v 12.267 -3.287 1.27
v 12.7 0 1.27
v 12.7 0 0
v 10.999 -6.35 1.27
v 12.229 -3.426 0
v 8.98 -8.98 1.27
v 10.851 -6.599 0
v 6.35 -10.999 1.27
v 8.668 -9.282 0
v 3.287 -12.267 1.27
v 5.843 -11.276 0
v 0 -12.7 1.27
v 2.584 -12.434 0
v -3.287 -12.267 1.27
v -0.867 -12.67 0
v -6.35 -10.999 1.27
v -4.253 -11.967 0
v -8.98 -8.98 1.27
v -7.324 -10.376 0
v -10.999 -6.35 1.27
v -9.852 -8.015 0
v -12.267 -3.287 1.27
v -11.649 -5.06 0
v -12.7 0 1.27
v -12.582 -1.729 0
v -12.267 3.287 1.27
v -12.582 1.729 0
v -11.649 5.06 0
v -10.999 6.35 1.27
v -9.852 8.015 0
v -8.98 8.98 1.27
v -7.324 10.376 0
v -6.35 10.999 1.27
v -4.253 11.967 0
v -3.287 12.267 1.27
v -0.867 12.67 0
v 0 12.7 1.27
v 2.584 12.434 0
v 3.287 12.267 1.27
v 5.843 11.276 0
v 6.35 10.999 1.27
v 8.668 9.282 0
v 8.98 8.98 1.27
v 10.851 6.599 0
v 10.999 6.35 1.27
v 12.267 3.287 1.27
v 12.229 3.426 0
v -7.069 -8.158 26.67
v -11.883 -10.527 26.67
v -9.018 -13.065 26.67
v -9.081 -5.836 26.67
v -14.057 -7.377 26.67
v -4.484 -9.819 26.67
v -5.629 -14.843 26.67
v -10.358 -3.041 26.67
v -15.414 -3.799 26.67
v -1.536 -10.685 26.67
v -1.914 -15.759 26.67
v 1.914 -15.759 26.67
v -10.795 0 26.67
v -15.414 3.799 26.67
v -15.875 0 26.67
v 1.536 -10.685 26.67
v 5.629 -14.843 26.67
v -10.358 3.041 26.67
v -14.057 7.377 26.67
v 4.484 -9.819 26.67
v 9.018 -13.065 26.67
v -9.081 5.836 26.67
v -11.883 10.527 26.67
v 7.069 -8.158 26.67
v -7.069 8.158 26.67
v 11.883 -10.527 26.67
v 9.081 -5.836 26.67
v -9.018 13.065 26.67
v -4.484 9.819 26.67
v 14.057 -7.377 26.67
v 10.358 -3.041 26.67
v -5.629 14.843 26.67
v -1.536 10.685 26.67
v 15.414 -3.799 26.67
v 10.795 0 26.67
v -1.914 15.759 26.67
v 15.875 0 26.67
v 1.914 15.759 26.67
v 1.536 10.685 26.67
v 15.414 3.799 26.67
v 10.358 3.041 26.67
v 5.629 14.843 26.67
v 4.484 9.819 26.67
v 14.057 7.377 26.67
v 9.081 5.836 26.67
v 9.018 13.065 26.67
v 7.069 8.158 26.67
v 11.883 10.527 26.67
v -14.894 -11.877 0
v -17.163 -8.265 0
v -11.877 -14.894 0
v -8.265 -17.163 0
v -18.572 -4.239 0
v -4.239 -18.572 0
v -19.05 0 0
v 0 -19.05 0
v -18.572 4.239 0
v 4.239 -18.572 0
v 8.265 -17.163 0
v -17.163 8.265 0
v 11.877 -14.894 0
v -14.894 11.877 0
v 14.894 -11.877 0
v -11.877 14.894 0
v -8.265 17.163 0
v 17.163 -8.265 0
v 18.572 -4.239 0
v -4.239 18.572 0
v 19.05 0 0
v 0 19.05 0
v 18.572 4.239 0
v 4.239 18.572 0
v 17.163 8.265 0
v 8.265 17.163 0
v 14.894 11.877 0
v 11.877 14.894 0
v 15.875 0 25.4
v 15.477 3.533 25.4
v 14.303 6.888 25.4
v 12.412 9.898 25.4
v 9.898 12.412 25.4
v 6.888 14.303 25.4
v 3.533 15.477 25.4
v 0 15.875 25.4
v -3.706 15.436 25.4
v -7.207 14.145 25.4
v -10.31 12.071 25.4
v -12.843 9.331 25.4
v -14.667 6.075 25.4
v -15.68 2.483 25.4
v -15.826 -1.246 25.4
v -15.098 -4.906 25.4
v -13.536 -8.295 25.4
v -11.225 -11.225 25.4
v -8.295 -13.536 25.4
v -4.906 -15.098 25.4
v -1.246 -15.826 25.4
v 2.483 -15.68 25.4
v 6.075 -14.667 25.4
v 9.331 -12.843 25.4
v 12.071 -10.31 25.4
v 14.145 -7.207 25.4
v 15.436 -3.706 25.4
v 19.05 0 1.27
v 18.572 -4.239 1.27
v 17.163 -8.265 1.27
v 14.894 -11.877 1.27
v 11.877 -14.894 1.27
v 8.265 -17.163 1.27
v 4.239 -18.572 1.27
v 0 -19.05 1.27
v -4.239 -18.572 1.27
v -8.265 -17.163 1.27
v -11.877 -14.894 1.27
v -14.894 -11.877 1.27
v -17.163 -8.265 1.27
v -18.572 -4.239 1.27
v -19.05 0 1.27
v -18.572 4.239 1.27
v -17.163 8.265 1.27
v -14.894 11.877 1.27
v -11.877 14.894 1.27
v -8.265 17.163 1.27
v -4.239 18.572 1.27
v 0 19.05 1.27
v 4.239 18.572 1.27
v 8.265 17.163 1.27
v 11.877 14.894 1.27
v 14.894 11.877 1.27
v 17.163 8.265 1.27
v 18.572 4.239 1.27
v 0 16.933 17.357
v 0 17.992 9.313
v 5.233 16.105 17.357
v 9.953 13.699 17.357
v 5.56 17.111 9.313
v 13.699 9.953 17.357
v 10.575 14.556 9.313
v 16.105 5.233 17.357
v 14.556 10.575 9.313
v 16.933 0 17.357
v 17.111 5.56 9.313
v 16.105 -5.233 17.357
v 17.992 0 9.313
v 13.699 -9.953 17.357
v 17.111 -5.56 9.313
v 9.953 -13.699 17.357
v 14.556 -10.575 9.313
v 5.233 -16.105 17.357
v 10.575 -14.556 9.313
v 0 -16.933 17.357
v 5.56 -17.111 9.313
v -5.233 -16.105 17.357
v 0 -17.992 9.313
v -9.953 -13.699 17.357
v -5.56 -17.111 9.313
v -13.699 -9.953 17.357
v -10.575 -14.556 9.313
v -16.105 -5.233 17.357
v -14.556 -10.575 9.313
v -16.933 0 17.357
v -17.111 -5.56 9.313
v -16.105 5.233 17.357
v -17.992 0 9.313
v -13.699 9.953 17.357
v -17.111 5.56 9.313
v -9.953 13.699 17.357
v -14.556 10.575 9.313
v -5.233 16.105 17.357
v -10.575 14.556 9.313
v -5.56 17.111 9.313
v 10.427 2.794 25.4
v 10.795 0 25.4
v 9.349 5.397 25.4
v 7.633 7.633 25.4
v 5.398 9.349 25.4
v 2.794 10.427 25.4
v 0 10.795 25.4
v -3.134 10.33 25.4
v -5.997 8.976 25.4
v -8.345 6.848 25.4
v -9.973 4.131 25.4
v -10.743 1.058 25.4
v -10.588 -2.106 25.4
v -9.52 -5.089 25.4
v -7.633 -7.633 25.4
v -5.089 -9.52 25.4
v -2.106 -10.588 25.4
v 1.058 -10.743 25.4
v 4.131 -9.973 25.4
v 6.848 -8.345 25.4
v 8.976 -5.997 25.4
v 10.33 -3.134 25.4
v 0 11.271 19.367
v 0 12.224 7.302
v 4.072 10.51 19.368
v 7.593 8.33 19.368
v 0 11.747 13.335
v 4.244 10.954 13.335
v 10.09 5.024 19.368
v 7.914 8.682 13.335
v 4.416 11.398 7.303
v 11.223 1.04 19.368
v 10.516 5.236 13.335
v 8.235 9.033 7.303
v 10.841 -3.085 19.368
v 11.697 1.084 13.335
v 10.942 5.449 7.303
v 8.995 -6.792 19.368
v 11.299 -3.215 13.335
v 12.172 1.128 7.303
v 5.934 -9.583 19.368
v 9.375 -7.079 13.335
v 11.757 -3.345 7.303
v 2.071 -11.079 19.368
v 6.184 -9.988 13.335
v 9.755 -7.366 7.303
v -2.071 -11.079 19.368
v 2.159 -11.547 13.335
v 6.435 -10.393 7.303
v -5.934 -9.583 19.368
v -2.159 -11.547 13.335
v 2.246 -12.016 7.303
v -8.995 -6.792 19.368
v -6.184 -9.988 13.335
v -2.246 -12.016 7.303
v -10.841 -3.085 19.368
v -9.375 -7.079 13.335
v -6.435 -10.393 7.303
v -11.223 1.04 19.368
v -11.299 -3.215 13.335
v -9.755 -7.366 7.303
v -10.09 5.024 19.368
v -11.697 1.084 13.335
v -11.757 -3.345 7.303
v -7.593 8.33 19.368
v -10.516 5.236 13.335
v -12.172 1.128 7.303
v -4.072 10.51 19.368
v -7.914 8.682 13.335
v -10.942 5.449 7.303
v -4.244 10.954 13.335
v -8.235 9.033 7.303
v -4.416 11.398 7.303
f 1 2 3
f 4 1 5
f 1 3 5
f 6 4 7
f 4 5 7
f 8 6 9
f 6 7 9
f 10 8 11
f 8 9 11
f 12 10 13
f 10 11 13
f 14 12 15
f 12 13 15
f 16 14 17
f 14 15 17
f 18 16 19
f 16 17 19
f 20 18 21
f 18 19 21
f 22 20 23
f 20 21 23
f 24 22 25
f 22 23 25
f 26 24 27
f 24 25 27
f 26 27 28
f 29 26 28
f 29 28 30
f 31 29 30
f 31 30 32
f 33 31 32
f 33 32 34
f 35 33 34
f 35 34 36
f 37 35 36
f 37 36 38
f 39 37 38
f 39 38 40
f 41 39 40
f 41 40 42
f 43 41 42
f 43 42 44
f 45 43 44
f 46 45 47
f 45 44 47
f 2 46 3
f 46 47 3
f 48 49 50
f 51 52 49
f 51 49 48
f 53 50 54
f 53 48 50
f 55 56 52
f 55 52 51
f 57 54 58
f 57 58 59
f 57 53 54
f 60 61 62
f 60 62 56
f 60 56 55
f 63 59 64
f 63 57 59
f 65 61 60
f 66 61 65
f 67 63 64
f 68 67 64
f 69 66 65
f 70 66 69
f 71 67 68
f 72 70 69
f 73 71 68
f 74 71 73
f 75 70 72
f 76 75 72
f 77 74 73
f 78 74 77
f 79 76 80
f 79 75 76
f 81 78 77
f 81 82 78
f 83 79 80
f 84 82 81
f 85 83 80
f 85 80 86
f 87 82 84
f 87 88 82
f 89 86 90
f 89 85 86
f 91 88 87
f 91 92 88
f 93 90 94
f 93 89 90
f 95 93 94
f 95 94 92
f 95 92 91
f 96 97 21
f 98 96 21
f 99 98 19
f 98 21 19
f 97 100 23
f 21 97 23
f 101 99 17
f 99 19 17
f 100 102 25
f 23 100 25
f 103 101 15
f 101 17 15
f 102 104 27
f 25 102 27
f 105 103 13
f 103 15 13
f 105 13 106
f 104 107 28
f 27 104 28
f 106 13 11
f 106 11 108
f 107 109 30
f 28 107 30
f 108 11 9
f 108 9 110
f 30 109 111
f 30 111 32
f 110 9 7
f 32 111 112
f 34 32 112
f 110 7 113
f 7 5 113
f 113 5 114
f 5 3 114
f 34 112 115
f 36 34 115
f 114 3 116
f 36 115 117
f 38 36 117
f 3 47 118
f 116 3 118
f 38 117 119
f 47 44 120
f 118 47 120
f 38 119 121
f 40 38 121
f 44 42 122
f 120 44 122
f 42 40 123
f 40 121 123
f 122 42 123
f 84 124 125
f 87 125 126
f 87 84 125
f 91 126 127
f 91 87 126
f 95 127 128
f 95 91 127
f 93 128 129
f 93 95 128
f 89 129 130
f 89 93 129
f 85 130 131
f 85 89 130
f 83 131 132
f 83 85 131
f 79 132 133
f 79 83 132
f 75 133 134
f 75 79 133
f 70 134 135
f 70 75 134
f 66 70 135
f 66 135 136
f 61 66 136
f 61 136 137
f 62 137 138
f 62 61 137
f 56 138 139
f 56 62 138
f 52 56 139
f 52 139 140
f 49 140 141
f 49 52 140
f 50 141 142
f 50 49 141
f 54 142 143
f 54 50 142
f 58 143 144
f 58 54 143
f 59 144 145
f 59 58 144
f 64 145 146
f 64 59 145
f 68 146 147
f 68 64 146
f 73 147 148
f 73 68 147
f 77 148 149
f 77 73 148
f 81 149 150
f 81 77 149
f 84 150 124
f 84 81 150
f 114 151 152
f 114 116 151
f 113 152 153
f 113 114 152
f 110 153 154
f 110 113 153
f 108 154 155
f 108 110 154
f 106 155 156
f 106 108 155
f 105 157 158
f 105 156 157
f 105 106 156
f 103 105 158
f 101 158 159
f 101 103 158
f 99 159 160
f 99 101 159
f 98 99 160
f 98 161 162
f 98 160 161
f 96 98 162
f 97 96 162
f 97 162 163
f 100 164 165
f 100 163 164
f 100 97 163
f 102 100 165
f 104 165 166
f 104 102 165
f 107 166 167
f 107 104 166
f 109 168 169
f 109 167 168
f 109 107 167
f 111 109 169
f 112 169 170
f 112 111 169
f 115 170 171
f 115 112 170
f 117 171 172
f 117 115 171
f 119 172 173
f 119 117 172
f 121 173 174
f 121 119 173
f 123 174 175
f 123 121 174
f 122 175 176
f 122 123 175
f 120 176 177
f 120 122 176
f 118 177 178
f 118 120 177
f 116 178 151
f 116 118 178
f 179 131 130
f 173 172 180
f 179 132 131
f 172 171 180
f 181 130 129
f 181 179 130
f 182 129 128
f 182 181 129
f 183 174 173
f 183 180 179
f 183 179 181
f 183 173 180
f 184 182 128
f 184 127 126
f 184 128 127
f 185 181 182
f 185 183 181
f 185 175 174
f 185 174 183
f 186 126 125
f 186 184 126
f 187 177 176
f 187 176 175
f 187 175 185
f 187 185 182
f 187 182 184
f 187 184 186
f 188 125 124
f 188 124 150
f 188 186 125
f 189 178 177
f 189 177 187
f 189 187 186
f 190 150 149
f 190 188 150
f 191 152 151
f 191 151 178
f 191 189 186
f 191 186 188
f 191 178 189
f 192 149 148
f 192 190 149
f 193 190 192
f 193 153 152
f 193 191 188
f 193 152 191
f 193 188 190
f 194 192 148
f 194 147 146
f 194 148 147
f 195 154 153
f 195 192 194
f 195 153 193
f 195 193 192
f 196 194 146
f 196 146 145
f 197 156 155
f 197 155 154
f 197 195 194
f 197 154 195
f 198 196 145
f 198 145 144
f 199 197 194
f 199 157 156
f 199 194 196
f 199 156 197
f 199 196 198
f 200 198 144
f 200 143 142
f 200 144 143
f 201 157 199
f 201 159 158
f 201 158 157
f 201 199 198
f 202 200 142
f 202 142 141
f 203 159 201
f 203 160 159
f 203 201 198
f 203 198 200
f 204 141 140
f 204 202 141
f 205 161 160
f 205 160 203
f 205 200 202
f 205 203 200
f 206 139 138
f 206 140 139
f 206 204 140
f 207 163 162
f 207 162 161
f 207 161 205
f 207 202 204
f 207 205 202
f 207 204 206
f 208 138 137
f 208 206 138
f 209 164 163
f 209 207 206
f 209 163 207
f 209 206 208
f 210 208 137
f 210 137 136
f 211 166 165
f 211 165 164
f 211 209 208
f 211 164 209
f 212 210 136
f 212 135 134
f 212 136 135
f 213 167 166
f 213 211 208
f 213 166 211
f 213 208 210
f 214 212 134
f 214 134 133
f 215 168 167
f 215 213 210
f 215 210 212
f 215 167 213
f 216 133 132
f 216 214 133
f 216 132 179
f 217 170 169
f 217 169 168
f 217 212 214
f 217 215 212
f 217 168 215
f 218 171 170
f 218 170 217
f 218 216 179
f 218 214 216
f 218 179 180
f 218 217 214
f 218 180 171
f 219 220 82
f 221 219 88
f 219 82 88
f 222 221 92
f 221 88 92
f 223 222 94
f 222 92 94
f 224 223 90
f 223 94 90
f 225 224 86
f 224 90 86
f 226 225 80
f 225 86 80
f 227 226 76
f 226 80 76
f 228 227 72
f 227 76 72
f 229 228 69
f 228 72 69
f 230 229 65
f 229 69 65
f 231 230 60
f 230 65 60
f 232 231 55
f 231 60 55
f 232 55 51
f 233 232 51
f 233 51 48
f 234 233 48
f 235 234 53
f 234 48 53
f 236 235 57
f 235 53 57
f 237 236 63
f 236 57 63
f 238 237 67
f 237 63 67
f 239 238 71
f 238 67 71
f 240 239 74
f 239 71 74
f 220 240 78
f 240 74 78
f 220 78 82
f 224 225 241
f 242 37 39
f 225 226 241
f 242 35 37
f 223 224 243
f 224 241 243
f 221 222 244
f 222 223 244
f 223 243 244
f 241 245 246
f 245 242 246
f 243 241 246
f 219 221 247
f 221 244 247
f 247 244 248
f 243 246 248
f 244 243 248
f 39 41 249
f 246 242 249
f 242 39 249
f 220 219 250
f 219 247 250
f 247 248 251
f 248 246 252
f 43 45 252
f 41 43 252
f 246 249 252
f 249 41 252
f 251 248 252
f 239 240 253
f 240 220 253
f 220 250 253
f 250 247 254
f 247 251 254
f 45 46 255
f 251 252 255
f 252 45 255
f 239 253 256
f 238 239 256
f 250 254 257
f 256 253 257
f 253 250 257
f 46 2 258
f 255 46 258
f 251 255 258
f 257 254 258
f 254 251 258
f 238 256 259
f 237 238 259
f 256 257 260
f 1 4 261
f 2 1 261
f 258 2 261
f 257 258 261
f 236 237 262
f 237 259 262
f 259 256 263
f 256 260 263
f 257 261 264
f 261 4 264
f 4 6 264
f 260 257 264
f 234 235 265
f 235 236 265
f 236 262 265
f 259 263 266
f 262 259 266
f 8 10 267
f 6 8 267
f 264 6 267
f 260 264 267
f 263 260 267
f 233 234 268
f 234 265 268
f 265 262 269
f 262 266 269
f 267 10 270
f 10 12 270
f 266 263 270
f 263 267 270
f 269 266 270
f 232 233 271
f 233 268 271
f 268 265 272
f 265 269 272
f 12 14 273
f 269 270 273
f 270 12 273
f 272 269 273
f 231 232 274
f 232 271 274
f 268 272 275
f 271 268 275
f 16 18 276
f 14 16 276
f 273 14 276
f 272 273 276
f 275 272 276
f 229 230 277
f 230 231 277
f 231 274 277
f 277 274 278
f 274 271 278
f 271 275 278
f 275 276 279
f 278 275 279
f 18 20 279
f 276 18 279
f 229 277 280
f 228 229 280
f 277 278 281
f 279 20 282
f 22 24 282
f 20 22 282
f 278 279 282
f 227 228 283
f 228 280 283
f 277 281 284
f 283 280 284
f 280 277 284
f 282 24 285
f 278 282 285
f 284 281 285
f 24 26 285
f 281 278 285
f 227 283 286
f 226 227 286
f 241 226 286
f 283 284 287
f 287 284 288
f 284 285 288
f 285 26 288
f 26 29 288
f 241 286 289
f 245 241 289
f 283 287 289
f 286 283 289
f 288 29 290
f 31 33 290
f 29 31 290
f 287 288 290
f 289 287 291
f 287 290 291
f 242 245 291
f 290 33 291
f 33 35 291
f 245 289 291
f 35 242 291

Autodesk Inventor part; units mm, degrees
ref_plane "YZ Plane" through (0, 0, 0) normal (1, 0, 0) x (0, 1, 0)
sketch "Sketch2" plane through (0, 0, 0) normal (0, 0, 1) x (1, 0, 0)
  circle A0 centre (0, 0) radius 19.05
  circle A1 centre (0, 0) radius 12.7
  dimension "d0" = 38.1
  dimension "d1" = 25.4
ref_plane "Work Plane1" through (0, 0, 26.67) normal (0, 0, 1) x (1, 0, 0)
sketch "Sketch3" plane through (0, 0, 26.67) normal (0, 0, 1) x (1, 0, 0)
  circle A0 centre (0, 0) radius 15.875
  circle A1 centre (0, 0) radius 10.795
  dimension "d5" = 31.75
  dimension "d6" = 21.59
extrude "Extrusion2" add sketch "Sketch3" against normal blind 1.27
extrude "Extrusion3" add sketch "Sketch2" along normal blind 1.27
sketch "Sketch4" plane through (0, 0, 26.67) normal (0, 0, 1) x (1, 0, 0)
  circle A0 centre (0, 0) radius 19.05 projected
  line L0 (0, 19.05) -> (0, 0) construction
ref_plane "Work Plane2" through (0, 19.05, 26.67) normal (1, 0, 0) x (0, -1, 0)
sketch "Sketch5" plane through (0, 19.05, 26.67) normal (1, 0, 0) x (0, -1, 0)
  line L0 (34.925, 1.27) -> (3.175, 1.27)
  line L1 (0, 25.4) -> (38.1, 25.4)
  line L2 (3.175, 1.27) -> (0, 25.4)
  line L3 (8.255, 1.27) -> (29.845, 1.27)
  line L4 (31.75, 25.4) -> (6.35, 25.4)
  line L5 (6.35, 1.27) -> (6.35, 25.4)
  line L6 (6.35, 25.4) -> (0, 25.4)
  line L7 (8.255, 1.27) -> (3.175, 1.27)
  line L8 (19.05, -0.091501) -> (19.05, 9.410296) construction
  point P0 (19.05, 26.67)
sketch "Sketch5 outline for Revolution1" plane through (0, 19.05, 26.67) normal (1, 0, 0) x (0, -1, 0)
  line L0 (0, 25.4) -> (3.175, 1.27)
  line L1 (6.35, 25.4) -> (0, 25.4)
  line L2 (8.255, 1.27) -> (6.35, 25.4)
  line L3 (3.175, 1.27) -> (8.255, 1.27)
revolve "Revolution1" add sketch "Sketch5 outline for Revolution1" angle 360 about axis through (0, 0, 26.761501) along (0, 0, -1)
properties part number "ecomake end part"
